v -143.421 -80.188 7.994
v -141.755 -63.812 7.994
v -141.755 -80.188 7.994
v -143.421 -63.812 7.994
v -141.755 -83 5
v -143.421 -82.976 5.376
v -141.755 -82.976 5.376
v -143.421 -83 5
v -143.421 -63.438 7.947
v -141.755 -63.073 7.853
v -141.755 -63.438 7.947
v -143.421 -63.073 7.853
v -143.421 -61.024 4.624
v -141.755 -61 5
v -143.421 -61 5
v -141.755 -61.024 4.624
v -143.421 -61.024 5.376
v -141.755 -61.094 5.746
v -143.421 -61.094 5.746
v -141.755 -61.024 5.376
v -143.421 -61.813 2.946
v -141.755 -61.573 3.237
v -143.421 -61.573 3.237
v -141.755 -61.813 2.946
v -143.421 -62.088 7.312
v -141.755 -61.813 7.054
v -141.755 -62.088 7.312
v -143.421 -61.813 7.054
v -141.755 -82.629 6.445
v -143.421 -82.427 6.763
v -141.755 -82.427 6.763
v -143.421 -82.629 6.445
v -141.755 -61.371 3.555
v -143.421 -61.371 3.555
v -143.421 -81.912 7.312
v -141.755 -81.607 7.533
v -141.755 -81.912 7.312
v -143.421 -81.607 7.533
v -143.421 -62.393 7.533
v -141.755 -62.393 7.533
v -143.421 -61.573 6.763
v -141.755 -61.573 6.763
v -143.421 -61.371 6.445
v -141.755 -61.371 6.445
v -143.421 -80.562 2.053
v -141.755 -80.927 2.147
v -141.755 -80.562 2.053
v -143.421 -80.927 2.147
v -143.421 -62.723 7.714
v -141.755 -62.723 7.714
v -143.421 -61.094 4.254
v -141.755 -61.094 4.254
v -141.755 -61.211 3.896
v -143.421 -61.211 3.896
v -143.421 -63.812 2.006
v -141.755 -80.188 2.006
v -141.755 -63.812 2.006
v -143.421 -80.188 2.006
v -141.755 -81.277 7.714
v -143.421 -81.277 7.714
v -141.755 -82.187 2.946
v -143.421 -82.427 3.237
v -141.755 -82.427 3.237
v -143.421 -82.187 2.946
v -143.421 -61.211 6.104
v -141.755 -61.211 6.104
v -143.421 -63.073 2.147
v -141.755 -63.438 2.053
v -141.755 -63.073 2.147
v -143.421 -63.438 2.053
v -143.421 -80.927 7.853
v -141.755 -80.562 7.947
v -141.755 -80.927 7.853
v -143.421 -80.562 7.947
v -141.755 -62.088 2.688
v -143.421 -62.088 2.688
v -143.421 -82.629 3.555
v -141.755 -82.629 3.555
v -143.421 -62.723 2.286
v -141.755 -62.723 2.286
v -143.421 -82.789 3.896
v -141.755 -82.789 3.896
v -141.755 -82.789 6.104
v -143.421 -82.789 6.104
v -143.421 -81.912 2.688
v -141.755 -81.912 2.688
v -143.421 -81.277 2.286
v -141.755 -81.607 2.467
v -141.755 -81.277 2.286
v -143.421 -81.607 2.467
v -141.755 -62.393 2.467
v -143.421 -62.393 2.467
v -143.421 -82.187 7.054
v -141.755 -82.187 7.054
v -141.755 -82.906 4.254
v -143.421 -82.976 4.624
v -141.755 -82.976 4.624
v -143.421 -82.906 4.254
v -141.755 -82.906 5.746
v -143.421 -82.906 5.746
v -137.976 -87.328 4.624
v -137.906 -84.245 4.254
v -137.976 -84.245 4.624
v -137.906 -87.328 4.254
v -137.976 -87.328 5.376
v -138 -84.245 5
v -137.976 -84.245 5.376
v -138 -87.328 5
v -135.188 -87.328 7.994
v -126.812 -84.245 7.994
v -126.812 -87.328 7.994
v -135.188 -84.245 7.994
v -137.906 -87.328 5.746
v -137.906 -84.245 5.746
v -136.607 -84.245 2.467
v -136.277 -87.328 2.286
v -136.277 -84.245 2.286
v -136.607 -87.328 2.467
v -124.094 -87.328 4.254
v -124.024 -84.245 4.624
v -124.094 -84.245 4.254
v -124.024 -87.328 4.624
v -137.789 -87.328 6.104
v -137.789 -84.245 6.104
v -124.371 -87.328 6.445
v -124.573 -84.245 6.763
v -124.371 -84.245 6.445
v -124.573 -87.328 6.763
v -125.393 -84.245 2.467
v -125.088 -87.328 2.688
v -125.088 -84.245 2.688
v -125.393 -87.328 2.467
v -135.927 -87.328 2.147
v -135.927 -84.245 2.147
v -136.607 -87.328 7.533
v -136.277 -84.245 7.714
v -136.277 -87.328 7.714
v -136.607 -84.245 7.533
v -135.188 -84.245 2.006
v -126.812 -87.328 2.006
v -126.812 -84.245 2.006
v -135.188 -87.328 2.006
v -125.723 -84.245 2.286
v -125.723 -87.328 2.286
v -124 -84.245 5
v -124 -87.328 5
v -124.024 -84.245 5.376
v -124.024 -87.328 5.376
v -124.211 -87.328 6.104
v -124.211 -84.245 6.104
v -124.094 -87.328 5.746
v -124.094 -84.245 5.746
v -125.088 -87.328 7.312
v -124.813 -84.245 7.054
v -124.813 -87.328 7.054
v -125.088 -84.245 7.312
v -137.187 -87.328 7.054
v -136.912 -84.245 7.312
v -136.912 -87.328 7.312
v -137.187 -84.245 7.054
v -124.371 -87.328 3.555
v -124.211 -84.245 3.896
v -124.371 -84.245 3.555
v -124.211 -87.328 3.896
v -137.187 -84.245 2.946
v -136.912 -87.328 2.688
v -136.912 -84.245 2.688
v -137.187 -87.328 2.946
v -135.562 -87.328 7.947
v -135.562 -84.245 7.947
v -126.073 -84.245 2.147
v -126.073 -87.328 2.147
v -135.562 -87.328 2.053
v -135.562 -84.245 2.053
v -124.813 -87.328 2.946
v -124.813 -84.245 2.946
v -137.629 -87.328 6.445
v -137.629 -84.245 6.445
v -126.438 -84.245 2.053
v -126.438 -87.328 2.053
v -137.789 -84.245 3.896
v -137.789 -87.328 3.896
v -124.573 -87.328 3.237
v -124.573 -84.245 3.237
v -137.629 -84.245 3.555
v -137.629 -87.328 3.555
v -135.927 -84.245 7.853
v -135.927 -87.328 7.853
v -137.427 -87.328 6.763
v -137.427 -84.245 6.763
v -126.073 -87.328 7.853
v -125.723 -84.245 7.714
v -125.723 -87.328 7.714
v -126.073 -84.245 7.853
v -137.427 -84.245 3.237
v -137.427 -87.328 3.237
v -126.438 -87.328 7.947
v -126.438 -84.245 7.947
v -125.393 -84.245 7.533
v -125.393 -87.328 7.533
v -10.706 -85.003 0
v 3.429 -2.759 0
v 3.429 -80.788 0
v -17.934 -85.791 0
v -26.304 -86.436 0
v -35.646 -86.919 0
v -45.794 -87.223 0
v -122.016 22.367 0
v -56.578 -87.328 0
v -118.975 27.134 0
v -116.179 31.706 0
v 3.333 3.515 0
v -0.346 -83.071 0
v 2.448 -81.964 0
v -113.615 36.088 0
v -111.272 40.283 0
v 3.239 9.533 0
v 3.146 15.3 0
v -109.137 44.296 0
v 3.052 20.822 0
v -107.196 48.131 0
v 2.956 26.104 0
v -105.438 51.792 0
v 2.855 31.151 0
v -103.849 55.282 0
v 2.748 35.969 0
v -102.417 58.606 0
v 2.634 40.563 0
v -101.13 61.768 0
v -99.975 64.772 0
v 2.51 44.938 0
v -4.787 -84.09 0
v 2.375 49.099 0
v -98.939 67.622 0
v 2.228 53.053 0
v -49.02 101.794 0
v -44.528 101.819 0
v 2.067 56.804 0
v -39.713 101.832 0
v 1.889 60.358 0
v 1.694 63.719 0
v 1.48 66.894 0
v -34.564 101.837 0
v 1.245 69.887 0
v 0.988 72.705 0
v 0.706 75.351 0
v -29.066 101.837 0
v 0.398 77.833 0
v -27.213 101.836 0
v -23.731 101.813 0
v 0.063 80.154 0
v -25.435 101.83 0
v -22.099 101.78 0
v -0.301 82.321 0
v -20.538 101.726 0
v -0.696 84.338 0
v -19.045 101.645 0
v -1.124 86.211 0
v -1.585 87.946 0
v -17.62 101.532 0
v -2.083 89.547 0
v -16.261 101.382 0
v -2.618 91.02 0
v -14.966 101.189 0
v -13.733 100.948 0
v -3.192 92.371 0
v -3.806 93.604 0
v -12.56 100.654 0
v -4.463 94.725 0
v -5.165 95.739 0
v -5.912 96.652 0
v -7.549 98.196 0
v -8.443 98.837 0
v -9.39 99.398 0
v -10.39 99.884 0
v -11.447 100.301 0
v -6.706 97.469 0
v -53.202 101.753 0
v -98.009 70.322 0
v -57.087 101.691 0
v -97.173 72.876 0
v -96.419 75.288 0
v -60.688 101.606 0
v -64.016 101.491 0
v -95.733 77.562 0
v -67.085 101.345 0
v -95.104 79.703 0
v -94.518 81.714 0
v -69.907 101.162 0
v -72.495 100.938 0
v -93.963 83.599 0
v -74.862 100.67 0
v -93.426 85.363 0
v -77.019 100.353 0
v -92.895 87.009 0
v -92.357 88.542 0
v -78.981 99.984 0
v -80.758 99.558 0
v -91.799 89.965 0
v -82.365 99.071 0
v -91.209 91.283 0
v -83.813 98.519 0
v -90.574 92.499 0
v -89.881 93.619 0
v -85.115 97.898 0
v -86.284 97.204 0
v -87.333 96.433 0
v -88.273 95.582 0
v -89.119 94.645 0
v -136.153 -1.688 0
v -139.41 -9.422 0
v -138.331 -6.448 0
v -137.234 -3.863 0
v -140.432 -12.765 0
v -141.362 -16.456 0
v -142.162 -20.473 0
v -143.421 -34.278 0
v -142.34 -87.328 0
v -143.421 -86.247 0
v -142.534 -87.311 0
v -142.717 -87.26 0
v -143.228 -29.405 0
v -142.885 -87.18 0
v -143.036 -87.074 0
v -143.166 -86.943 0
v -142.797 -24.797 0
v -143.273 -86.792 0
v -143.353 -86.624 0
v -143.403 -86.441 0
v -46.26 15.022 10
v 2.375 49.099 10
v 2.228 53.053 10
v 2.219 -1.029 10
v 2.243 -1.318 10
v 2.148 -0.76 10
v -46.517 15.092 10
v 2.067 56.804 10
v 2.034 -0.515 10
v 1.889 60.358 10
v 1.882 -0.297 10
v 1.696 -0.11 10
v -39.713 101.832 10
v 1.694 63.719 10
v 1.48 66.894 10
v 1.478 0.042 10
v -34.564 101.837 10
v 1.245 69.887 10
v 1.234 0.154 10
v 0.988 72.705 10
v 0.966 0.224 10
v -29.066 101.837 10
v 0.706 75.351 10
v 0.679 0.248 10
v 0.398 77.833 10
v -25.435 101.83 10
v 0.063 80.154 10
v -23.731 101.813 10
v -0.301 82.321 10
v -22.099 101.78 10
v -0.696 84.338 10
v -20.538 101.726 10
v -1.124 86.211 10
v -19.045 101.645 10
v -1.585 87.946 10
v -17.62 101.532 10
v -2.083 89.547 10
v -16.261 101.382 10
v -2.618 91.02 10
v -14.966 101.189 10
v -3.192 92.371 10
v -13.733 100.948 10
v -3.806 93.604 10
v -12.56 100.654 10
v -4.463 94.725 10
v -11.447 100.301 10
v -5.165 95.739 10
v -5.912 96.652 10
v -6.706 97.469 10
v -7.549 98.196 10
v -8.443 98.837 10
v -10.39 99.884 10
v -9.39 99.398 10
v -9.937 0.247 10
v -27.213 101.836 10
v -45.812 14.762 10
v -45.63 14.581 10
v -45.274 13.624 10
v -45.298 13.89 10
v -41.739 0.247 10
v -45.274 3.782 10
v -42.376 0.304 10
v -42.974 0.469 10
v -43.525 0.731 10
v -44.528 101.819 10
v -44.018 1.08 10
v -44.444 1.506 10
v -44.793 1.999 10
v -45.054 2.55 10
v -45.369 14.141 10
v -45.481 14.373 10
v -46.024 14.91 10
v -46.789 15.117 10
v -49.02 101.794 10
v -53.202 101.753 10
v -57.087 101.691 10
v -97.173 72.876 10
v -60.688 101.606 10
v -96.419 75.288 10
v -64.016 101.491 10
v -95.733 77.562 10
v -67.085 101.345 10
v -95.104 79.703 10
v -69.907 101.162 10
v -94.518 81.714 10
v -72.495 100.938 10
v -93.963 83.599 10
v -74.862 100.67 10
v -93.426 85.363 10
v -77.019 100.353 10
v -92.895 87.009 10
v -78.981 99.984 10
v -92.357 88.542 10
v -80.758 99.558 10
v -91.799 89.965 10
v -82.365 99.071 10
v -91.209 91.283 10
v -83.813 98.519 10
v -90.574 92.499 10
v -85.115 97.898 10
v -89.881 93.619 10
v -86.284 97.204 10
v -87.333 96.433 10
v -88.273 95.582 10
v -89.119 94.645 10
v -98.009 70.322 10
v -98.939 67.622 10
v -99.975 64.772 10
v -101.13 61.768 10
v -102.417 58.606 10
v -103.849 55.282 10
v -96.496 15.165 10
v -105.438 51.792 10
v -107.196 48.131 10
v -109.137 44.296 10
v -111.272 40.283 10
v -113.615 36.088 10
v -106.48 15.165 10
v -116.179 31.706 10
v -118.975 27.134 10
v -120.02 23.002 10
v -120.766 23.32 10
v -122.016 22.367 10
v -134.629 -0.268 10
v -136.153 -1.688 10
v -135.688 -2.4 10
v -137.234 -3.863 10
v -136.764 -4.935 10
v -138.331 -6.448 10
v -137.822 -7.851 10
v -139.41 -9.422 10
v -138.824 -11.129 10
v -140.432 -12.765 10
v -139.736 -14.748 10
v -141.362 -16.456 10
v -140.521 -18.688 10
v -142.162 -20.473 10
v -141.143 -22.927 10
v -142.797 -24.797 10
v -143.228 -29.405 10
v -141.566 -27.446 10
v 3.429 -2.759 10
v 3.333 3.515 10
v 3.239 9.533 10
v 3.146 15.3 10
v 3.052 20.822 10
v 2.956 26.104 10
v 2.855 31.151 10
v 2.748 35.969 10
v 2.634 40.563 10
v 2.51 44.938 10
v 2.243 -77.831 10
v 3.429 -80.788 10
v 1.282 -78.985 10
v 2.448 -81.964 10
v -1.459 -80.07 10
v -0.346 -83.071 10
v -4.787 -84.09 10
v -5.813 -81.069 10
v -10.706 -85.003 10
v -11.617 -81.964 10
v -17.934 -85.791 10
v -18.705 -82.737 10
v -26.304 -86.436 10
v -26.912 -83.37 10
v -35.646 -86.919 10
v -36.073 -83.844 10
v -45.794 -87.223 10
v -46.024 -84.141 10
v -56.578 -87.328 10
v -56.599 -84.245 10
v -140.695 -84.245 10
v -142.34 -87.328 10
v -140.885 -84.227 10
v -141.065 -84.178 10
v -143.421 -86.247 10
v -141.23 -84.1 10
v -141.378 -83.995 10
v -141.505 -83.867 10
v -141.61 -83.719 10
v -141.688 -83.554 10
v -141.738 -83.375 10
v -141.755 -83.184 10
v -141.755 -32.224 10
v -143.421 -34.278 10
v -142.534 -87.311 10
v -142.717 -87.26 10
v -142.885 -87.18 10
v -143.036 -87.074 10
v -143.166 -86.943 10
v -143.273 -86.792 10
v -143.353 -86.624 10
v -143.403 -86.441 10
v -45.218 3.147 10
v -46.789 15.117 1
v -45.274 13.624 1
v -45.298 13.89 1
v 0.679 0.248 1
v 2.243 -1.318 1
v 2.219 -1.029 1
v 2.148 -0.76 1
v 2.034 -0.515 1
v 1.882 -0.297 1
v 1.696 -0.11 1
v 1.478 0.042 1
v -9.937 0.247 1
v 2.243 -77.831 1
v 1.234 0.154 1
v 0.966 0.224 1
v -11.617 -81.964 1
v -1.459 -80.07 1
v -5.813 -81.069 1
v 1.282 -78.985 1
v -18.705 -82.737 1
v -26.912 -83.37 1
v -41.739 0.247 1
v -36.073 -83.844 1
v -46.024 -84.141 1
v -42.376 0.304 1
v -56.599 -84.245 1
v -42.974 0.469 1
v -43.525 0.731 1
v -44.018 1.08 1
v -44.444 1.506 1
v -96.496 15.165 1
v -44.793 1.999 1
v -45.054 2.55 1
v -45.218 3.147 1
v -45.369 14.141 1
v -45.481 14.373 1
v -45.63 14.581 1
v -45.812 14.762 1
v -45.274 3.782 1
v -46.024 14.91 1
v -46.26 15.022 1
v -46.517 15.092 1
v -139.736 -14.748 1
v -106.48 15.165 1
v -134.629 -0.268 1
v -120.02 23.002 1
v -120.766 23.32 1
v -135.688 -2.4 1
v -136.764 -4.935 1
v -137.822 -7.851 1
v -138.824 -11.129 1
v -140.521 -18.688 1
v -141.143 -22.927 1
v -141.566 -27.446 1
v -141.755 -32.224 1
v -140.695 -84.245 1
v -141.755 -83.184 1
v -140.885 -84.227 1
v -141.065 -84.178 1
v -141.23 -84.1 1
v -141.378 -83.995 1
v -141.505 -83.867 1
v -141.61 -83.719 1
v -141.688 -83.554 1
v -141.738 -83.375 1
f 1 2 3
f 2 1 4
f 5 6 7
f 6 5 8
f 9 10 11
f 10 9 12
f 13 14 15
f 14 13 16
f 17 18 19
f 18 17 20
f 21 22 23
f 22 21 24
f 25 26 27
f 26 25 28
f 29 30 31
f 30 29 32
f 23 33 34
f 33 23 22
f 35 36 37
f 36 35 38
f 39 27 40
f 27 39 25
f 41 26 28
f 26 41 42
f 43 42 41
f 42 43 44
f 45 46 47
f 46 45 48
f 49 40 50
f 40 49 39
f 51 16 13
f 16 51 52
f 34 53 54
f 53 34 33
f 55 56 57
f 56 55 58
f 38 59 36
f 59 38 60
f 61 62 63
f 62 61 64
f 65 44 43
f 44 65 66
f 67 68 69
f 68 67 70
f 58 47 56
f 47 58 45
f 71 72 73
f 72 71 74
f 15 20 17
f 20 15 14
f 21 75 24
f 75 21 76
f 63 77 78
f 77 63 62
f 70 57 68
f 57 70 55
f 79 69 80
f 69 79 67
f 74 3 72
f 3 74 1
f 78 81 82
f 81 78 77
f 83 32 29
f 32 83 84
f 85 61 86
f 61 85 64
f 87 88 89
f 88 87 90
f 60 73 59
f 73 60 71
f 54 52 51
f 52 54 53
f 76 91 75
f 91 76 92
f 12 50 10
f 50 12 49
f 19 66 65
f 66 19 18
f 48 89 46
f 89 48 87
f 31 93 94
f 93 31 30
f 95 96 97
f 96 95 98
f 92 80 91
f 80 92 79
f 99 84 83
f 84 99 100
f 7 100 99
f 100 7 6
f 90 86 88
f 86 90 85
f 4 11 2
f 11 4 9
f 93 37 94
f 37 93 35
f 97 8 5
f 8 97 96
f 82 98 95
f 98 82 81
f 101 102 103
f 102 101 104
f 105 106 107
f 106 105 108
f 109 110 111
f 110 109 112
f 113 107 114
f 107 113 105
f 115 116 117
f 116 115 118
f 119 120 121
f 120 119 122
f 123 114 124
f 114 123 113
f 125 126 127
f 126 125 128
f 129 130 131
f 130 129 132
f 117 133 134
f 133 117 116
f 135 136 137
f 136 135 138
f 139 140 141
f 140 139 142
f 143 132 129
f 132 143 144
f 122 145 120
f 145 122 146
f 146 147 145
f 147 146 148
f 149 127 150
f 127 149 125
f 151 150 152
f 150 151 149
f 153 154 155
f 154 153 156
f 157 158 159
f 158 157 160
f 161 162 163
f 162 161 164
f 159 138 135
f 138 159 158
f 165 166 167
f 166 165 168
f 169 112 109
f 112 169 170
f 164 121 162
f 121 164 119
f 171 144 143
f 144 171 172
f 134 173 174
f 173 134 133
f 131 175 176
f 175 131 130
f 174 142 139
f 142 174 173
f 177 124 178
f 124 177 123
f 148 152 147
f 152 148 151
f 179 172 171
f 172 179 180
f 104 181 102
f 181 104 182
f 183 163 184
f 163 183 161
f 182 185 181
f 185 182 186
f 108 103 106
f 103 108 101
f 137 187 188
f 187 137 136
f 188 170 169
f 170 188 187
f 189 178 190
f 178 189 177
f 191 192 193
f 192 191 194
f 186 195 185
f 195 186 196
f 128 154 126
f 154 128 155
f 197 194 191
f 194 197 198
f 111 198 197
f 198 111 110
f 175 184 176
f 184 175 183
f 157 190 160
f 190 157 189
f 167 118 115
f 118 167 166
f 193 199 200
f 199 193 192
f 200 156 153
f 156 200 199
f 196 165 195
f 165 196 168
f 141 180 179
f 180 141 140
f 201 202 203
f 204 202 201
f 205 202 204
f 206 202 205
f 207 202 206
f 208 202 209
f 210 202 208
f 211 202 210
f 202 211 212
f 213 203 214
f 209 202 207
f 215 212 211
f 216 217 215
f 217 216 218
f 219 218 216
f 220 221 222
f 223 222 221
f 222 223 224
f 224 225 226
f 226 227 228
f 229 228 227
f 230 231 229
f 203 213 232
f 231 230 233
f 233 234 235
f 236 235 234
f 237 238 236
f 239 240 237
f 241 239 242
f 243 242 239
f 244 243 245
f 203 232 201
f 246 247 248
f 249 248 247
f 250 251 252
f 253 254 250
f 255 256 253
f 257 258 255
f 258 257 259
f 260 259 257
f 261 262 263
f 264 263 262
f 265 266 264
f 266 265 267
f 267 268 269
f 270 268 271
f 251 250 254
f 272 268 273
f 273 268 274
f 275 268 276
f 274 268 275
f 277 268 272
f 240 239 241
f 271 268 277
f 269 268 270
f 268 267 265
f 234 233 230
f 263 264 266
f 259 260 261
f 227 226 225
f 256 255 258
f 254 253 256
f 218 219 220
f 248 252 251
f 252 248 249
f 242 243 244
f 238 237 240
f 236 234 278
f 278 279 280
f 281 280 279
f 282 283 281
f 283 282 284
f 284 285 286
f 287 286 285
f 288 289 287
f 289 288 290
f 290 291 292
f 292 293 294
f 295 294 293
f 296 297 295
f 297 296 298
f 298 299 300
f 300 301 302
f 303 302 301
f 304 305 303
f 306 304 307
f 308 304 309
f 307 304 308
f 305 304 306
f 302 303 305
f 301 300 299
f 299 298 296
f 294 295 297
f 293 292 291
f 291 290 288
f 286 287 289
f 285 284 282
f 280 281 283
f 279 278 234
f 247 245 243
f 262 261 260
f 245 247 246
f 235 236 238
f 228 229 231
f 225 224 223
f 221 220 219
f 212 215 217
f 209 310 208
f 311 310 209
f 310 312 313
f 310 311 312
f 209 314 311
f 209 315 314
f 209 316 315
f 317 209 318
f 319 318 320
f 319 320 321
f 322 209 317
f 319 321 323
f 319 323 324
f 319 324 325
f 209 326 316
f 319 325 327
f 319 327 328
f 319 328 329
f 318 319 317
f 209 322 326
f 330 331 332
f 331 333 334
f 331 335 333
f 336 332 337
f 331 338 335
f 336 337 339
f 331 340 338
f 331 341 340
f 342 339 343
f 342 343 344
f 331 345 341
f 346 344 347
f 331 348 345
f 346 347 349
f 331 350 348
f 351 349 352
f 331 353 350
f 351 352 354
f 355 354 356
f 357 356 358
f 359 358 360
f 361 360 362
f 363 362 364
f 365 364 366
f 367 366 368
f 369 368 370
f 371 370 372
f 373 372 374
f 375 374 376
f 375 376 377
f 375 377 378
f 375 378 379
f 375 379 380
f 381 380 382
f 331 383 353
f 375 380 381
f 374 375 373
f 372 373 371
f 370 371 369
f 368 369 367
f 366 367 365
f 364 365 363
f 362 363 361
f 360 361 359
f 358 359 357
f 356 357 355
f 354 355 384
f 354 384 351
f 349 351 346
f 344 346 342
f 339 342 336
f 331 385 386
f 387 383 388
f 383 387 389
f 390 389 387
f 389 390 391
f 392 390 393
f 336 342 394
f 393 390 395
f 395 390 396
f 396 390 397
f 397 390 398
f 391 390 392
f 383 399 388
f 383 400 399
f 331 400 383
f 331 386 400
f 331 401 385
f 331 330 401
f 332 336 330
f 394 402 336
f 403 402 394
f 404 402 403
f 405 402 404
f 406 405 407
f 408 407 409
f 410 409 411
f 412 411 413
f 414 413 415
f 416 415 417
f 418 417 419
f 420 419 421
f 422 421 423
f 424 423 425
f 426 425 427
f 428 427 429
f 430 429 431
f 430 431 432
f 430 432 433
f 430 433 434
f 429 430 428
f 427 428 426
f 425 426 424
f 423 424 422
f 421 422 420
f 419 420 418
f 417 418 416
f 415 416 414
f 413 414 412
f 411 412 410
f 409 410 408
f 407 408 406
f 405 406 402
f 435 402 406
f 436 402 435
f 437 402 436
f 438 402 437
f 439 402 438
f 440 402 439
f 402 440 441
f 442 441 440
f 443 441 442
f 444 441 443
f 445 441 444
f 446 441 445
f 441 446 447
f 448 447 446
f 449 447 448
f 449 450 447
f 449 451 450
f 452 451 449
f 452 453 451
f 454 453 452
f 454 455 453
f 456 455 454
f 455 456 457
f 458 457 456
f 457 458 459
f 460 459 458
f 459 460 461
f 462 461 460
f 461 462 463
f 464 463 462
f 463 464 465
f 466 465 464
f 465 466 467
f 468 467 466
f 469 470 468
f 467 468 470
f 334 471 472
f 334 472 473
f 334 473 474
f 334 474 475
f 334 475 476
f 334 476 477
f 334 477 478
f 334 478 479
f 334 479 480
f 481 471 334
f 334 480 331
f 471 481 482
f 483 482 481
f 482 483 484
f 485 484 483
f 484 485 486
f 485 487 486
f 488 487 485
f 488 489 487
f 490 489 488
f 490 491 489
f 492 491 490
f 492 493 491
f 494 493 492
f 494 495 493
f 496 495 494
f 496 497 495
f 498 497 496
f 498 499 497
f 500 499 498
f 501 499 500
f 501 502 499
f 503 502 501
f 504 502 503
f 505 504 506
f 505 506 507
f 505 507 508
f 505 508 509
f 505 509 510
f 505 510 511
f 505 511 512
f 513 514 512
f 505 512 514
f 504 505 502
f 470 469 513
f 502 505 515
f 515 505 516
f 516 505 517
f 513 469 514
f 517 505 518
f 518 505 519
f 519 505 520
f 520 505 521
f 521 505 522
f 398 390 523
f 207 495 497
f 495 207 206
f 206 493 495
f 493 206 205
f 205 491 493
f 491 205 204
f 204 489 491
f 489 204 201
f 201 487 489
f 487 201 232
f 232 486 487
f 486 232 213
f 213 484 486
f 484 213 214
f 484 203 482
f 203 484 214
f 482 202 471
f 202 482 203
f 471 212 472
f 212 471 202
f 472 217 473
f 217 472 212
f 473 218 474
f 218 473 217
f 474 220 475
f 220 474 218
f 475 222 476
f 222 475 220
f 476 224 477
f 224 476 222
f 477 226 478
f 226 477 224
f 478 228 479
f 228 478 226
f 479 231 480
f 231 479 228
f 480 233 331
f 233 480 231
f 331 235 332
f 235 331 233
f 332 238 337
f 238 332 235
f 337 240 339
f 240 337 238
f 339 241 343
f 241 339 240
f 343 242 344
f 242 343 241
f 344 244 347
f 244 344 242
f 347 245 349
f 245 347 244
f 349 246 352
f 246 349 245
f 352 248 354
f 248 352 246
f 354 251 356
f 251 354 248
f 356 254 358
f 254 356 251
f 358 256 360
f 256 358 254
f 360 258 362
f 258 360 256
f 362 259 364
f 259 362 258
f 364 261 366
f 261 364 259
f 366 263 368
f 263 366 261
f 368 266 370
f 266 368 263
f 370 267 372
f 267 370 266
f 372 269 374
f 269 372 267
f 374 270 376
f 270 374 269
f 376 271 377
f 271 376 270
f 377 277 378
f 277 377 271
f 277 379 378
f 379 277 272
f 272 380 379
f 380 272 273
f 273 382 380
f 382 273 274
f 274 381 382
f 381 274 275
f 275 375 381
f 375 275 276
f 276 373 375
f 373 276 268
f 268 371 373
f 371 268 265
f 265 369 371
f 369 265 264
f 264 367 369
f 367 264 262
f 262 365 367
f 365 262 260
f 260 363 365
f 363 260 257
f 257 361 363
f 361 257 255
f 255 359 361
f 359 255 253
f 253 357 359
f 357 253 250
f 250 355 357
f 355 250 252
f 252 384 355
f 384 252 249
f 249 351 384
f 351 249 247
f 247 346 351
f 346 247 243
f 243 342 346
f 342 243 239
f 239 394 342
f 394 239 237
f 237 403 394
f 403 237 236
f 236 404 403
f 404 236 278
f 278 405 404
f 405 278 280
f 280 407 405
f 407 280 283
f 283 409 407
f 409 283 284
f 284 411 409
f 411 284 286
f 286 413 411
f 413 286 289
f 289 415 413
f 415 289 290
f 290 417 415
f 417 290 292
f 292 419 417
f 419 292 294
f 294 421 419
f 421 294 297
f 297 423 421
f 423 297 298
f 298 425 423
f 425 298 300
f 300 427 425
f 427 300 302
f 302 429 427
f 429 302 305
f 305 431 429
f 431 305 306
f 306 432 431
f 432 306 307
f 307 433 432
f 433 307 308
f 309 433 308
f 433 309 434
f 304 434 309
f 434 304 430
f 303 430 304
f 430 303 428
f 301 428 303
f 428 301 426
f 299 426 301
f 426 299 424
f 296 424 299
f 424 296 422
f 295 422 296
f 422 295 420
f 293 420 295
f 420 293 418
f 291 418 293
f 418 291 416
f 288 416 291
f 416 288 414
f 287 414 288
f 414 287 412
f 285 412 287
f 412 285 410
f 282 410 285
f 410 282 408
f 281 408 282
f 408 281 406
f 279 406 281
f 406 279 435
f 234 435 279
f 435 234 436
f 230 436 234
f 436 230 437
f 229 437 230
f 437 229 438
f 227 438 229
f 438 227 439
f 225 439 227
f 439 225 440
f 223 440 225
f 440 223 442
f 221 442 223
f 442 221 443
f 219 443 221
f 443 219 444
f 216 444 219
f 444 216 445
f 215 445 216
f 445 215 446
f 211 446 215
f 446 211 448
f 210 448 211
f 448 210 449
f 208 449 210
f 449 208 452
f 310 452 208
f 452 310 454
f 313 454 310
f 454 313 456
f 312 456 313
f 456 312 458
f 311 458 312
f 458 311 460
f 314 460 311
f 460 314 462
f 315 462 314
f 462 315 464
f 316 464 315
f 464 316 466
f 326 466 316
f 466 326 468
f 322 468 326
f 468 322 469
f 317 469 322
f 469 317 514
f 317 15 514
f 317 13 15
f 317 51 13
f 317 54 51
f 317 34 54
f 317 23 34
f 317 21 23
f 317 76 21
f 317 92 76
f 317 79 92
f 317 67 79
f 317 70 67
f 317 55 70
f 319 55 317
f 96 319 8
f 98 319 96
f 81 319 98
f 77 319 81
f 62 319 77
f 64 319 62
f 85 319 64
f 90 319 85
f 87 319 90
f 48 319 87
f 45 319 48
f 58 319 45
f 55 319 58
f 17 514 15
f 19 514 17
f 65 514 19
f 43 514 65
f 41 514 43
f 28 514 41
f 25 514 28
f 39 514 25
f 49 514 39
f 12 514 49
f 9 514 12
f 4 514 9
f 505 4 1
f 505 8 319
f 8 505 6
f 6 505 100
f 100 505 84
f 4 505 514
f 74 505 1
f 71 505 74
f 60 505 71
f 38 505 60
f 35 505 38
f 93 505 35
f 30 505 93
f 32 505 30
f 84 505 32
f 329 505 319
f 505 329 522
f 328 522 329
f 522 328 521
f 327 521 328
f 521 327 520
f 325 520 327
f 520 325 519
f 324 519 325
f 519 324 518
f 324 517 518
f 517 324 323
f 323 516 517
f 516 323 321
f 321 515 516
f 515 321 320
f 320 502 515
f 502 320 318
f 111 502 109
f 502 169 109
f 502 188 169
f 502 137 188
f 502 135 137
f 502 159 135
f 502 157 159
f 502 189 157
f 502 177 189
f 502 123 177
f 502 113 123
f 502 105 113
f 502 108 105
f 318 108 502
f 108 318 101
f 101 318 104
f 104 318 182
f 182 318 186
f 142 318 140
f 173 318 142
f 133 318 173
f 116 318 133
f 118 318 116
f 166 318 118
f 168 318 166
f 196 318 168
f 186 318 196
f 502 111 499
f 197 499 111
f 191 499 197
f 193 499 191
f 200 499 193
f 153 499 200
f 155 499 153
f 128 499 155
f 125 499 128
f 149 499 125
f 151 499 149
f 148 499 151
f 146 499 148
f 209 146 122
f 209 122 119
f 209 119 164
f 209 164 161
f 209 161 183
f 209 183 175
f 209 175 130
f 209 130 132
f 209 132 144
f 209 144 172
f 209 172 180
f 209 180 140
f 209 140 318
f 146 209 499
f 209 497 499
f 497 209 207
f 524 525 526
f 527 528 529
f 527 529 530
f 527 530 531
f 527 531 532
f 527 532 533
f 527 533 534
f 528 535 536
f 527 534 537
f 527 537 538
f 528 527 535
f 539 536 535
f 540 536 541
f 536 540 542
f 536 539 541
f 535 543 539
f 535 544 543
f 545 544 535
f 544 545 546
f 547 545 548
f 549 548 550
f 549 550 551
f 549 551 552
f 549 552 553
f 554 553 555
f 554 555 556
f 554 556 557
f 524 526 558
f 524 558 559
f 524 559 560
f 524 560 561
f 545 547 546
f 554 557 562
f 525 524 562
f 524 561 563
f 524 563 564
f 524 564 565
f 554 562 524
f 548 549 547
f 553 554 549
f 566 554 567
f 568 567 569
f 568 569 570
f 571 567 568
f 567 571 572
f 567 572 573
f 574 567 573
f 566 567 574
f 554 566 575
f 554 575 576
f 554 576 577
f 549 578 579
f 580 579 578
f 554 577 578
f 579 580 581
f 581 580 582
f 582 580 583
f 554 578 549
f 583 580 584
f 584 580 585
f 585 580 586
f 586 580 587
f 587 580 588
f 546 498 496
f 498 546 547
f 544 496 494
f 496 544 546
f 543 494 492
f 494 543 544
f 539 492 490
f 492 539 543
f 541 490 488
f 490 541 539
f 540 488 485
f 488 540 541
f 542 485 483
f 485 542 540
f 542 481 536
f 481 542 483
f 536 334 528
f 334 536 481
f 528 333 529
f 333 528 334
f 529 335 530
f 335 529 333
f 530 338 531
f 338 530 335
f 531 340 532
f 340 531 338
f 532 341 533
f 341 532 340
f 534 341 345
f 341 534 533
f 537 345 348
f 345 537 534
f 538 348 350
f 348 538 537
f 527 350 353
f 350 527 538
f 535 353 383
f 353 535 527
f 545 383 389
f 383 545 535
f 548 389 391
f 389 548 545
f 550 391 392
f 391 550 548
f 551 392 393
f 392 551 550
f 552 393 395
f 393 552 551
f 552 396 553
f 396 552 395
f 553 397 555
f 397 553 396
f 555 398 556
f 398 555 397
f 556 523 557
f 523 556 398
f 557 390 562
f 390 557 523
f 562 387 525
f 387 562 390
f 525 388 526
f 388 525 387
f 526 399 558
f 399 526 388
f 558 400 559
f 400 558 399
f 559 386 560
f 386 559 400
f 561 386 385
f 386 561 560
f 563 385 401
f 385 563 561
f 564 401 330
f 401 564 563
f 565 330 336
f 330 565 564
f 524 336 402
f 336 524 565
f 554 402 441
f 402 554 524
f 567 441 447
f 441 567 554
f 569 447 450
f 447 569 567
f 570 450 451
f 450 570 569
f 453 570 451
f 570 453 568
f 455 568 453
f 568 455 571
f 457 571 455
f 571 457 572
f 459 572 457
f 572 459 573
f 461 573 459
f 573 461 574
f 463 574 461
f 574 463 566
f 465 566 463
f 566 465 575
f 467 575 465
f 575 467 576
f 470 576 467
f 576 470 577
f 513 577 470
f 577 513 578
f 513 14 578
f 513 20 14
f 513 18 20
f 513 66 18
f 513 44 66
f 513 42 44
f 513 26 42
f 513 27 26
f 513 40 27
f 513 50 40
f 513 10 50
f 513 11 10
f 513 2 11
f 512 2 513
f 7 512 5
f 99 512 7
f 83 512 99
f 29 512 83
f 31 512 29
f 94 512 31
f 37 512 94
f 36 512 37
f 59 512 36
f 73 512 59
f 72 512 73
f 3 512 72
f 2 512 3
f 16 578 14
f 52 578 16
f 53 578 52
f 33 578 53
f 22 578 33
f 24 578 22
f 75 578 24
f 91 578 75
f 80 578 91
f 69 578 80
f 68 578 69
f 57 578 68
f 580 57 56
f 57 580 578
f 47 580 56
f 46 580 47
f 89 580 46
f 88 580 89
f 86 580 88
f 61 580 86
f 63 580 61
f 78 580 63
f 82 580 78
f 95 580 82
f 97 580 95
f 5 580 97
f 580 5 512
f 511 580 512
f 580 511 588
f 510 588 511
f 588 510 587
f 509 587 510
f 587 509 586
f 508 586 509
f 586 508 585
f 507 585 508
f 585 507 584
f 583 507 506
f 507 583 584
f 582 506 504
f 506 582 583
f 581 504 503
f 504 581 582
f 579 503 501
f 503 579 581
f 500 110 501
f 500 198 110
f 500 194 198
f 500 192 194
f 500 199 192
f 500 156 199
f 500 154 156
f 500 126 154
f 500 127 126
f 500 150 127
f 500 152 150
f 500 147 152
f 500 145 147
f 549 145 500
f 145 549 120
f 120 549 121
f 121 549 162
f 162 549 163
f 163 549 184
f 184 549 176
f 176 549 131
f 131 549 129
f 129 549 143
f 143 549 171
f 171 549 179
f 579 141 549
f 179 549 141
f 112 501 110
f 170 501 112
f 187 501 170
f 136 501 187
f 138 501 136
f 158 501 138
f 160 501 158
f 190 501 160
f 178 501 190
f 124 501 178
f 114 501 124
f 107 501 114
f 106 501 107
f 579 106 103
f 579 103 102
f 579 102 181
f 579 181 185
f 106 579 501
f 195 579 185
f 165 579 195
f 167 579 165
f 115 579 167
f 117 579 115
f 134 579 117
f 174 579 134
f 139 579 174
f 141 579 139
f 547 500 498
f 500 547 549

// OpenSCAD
// file: ../bezier.scad
function mix(p1, p2, t) = [p1[0] * (1 - t) + p2[0] * t, p1[1] * (1 - t) + p2[1] * t];

function bezier_point(p, t) =
    let (
        a = mix(p[0], p[1], t),
        b = mix(p[1], p[2], t),
        c = mix(p[2], p[3], t),
        d = mix(a, b, t),
        e = mix(b, c, t)
    )
    mix(d, e, t);

function bezier_points(p, N) = [
    for (i = [0 : N - 1]) bezier_point(p, i / (N - 1))
];
// file: ../profiles.scad
include <array_ops.scad>
include <bezier.scad>

n_corner_points = 10;

board_profile_points = concat(
    [[-119.504642, 22.529083], [-106.09824, 14.768994],
        [-106.09824, 14.768994], [-96.213288, 14.768994],
        [-96.213288, 14.768994], [-46.99839, 14.721548]],
bezier_points(
    [[-46.99839, 14.721548], [-46.16894, 14.721172], [-45.497997, 14.049582], [-
45.498384, 13.243936]], n_corner_points),
    [[-45.498384, 13.243936], [-45.498384, 3.499618]],
bezier_points(
    [[-45.498384, 3.499618], [-45.499493, 1.567921], [-43.9343, 0.00093], [-41.998735, -
0.000898]],
n_corner_points),
    [[-41.998735, -0.000898], [-10.510735, -0.000898],
        [-10.510735, -0.000898], [0, 0]],
bezier_points(
    [[0, 0], [0.876629, 0.003368], [1.548207, -0.667575], [1.548595, -1.550011]],
n_corner_points),
    [[1.548595, -1.550011], [1.548595, -77.305898]],
bezier_points(
    [[1.548595, -77.305898], [1.498595, -80.815755], [-24.536412, -83.655898], [-
56.710735, -83.655898]], n_corner_points),
    [[-56.710735, -83.655898], [-114.910735, -83.655898],
        [-114.910735, -83.655898], [-139.974397, -83.655898]],
bezier_points(
    [[-139.974397, -83.655898], [-140.553969, -83.655567], [-141.023536, -83.185462], [-
141.023875, -82.60589]], n_corner_points),
    [[-141.023875, -82.60589], [-141.023875, -32.15045]],
bezier_points(
    [[-141.023875, -32.15045], [-140.847733, -17.594028], [-137.053996, -6.226473], [-
133.968073, -0.510408]], n_corner_points),
    [[-133.968073, -0.510408], [-120.242566, 22.844102]]
);

wrist_support_top_points = concat(
    [[-119.504642, 22.529083], [-106.09824, 14.768994],
        [-106.09824, 14.768994], [-96.213288, 14.768994],
        [-96.213288, 14.768994], [-46.99839, 14.721548]],
bezier_points(
    [[-46.99839, 14.721548], [-46.16894, 14.721172], [-45.497997, 14.049582], [-
45.498384, 13.243936]], n_corner_points),
    [[-45.498384, 13.243936], [-45.498384, 3.499618]],
bezier_points(
    [[-45.498384, 3.499618], [-45.499493, 1.567921], [-43.9343, 0.00093], [-41.998735, -
0.000898]],
n_corner_points),
    [[-41.998735, -0.000898], [-10.510735, -0.000898],
        [-10.510735, -0.000898], [0, 0]],
bezier_points(
    [[0, 0], [0.876629, 0.003368], [1.548207, -0.667575], [1.548595, -1.550011]],
n_corner_points
)
);

board_top_points = concat(
    [[1.548595, -1.550011], [1.548595, -77.305898]],
bezier_points(
    [[1.548595, -77.305898], [1.498595, -80.815755], [-24.536412, -83.655898], [-
56.710735, -83.655898]], n_corner_points),
    [[-56.710735, -83.655898], [-114.910735, -83.655898],
        [-114.910735, -83.655898], [-139.974397, -83.655898]],
bezier_points(
    [[-139.974397, -83.655898], [-140.553969, -83.655567], [-141.023536, -83.185462], [-
141.023875, -82.60589]], n_corner_points),
    [[-141.023875, -82.60589], [-141.023875, -32.15045]],
bezier_points(
    [[-141.023875, -32.15045], [-140.847733, -17.594028], [-137.053996, -6.226473], [-
133.968073, -0.510408]], n_corner_points),
    [[-133.968073, -0.510408], [-120.242566, 22.844102]]
);

wrist_support_bottom_points = concat(
bezier_points(
    [
        [-120.242566, 22.844102],
        [-70, 100],
        [-120, 100],
        [-30, 100]
    ], n_corner_points * 5),
bezier_points(
    [
        [-30, 100],
        [0, 100],
        [0, 100],
        [1.548595, -1.550011]
    ], n_corner_points * 5)
);

case_profile_points = concat(
board_top_points,
wrist_support_bottom_points
);
// file: ../array_ops.scad
function reverse(arr) = [
    for (i = [1:len(arr)]) arr[len(arr) - i]
    ];

function translate2d(arr, tr) = [
    for (point = arr) [point[0] + tr[0], point[1] + tr[1]]
    ];

function scale2d(arr, factor, centerpoint) = [
    for (point = arr) [
                (point[0] - centerpoint[0]) * factor + centerpoint[0],
                (point[1] - centerpoint[1]) * factor + centerpoint[1],
        ]
    ];

function scale2d_multi(arr, factors, centerpoint) = [
    for (point = arr) [
                (point[0] - centerpoint[0]) * factors[0] + centerpoint[0],
                (point[1] - centerpoint[1]) * factors[1] + centerpoint[1],
        ]
    ];

function sum(v) = [for (p = v) 1] * v;

function get_center_point(points) =
    [
        sum([for (p = points) p[0]]) / len(points),
        sum([for (p = points) p[1]]) / len(points),
    ];
// file: ../config.scad
rotation = [10, 10, 170];
translation = [-160, 0, 25];
choc_scale = [0.95315, 0.91];
// file: ../base.scad
include <case.scad>
include <profiles.scad>

module base_volume(profile_points, outer_scale_margin, rotation, translation) {
    center_point = get_center_point(profile_points);
    linear_extrude(height = 120)
        projection(cut = false)
            translate(translation)
                rotate(rotation)
                    linear_extrude(height = 0.1)
                        translate([center_point[0], center_point[1], 0])
                            scale([1 + outer_scale_margin, 1 + outer_scale_margin, 1])
                                translate([-center_point[0], -center_point[1], 0])
                                    polygon(profile_points);
};


module keyboard_base(profile_points, outer_scale_margin, rotation, translation) {
    difference() {
        base_volume(
        profile_points = profile_points,
        outer_scale_margin = outer_scale_margin + 0.02,
        rotation = rotation,
        translation = translation
        );
        translate([0, 0, -0.1])
            base_volume(
            profile_points = profile_points,
            outer_scale_margin = outer_scale_margin - 0.03,
            rotation = rotation,
            translation = translation
            );

        translate(translation)
            rotate(rotation)
                translate([-500, -500, 3])
                    cube([1000, 1000, 1000]);

        translate(translation)
            rotate(rotation)
                keyboard_body(profile_points, 100, outer_scale_margin);

        translate(translation)
            rotate(rotation)
                case_holes();
    };
};
// file: ../case.scad
include <array_ops.scad>
include <profiles.scad>

$fn = 50;
outer_scale_margin = 0.03;

module board_with_thickenss(points) {
    linear_extrude(height = 2)
        polygon(points);
};

module keyboard_space(
profile_points,
bottom_thickenss,
case_height,
scale_margin, ,
eps = 0.01
) {
    center_point = get_center_point(profile_points);
    translate([0, 0, bottom_thickenss])
        linear_extrude(height = case_height - bottom_thickenss + eps)
            translate([center_point[0], center_point[1], 0])
                scale([1 + scale_margin, 1 + scale_margin, 1])
                    translate([-center_point[0], -center_point[1], 0])
                        polygon(profile_points);
};

module keyboard_body(profile_points, case_height, scale_margin) {
    center_point = get_center_point(profile_points);
    linear_extrude(height = case_height)
        translate([center_point[0], center_point[1], 0])
            scale([1 + scale_margin, 1 + scale_margin, 1])
                translate([-center_point[0], -center_point[1], 0])
                    polygon(profile_points);
};

function scale_wrist_support_points(
top_points, bottom_points, outer_scale, board_scale, case_center, board_center
) = concat(
scale2d(bottom_points, outer_scale, case_center),
scale2d(top_points, board_scale, board_center)
);

module case_hole(hole_height, hole_rad, hull_length) {
    linear_extrude(hole_height)
        hull() {
            translate([hull_length, 0, 0])
                circle(r = hole_rad);
            circle(r = hole_rad);
        };
};

module case_holes() {
    hole_height = 10;
    hole_rad = 3;
    hull_length = 8;
    translate([-148, -80, 5])
        rotate([90, 00, 90])
            case_hole(
            hole_height = hole_height,
            hole_rad = hole_rad,
            hull_length = hull_length * 2
            );
    translate([-135, -80, 5])
        rotate([90, 00, 0])
            case_hole(
            hole_height = hole_height,
            hole_rad = hole_rad,
            hull_length = hull_length
            );
};

module case(board_points, case_points) {
    case_height = 10;
    keyboard_hole_scale_margin = 0.01;
    bottom_thickenss = 1;
    difference() {
        keyboard_body(
        profile_points = case_points,
        case_height = case_height,
        scale_margin = outer_scale_margin
        );
        keyboard_space(
        profile_points = board_points,
        bottom_thickenss = bottom_thickenss,
        case_height = case_height,
        scale_margin = keyboard_hole_scale_margin
        );
        case_holes();
    };
};

module wrist_support(
top_points, bottom_points, outer_scale, board_scale, case_center, board_center
) {
    height = 1;
    board_height = 10;
    inset = 0.99;

    wrist_support_points_outer = scale_wrist_support_points(
    top_points,
    bottom_points,
    outer_scale,
    board_scale,
    case_center,
    board_center
    );
    translate([0, 0, board_height])
        linear_extrude(height)
            polygon(wrist_support_points_outer);
};
// main file
include <../case.scad>
include <../base.scad>
include <../config.scad>

case(
board_points = board_profile_points,
case_points = case_profile_points
);
